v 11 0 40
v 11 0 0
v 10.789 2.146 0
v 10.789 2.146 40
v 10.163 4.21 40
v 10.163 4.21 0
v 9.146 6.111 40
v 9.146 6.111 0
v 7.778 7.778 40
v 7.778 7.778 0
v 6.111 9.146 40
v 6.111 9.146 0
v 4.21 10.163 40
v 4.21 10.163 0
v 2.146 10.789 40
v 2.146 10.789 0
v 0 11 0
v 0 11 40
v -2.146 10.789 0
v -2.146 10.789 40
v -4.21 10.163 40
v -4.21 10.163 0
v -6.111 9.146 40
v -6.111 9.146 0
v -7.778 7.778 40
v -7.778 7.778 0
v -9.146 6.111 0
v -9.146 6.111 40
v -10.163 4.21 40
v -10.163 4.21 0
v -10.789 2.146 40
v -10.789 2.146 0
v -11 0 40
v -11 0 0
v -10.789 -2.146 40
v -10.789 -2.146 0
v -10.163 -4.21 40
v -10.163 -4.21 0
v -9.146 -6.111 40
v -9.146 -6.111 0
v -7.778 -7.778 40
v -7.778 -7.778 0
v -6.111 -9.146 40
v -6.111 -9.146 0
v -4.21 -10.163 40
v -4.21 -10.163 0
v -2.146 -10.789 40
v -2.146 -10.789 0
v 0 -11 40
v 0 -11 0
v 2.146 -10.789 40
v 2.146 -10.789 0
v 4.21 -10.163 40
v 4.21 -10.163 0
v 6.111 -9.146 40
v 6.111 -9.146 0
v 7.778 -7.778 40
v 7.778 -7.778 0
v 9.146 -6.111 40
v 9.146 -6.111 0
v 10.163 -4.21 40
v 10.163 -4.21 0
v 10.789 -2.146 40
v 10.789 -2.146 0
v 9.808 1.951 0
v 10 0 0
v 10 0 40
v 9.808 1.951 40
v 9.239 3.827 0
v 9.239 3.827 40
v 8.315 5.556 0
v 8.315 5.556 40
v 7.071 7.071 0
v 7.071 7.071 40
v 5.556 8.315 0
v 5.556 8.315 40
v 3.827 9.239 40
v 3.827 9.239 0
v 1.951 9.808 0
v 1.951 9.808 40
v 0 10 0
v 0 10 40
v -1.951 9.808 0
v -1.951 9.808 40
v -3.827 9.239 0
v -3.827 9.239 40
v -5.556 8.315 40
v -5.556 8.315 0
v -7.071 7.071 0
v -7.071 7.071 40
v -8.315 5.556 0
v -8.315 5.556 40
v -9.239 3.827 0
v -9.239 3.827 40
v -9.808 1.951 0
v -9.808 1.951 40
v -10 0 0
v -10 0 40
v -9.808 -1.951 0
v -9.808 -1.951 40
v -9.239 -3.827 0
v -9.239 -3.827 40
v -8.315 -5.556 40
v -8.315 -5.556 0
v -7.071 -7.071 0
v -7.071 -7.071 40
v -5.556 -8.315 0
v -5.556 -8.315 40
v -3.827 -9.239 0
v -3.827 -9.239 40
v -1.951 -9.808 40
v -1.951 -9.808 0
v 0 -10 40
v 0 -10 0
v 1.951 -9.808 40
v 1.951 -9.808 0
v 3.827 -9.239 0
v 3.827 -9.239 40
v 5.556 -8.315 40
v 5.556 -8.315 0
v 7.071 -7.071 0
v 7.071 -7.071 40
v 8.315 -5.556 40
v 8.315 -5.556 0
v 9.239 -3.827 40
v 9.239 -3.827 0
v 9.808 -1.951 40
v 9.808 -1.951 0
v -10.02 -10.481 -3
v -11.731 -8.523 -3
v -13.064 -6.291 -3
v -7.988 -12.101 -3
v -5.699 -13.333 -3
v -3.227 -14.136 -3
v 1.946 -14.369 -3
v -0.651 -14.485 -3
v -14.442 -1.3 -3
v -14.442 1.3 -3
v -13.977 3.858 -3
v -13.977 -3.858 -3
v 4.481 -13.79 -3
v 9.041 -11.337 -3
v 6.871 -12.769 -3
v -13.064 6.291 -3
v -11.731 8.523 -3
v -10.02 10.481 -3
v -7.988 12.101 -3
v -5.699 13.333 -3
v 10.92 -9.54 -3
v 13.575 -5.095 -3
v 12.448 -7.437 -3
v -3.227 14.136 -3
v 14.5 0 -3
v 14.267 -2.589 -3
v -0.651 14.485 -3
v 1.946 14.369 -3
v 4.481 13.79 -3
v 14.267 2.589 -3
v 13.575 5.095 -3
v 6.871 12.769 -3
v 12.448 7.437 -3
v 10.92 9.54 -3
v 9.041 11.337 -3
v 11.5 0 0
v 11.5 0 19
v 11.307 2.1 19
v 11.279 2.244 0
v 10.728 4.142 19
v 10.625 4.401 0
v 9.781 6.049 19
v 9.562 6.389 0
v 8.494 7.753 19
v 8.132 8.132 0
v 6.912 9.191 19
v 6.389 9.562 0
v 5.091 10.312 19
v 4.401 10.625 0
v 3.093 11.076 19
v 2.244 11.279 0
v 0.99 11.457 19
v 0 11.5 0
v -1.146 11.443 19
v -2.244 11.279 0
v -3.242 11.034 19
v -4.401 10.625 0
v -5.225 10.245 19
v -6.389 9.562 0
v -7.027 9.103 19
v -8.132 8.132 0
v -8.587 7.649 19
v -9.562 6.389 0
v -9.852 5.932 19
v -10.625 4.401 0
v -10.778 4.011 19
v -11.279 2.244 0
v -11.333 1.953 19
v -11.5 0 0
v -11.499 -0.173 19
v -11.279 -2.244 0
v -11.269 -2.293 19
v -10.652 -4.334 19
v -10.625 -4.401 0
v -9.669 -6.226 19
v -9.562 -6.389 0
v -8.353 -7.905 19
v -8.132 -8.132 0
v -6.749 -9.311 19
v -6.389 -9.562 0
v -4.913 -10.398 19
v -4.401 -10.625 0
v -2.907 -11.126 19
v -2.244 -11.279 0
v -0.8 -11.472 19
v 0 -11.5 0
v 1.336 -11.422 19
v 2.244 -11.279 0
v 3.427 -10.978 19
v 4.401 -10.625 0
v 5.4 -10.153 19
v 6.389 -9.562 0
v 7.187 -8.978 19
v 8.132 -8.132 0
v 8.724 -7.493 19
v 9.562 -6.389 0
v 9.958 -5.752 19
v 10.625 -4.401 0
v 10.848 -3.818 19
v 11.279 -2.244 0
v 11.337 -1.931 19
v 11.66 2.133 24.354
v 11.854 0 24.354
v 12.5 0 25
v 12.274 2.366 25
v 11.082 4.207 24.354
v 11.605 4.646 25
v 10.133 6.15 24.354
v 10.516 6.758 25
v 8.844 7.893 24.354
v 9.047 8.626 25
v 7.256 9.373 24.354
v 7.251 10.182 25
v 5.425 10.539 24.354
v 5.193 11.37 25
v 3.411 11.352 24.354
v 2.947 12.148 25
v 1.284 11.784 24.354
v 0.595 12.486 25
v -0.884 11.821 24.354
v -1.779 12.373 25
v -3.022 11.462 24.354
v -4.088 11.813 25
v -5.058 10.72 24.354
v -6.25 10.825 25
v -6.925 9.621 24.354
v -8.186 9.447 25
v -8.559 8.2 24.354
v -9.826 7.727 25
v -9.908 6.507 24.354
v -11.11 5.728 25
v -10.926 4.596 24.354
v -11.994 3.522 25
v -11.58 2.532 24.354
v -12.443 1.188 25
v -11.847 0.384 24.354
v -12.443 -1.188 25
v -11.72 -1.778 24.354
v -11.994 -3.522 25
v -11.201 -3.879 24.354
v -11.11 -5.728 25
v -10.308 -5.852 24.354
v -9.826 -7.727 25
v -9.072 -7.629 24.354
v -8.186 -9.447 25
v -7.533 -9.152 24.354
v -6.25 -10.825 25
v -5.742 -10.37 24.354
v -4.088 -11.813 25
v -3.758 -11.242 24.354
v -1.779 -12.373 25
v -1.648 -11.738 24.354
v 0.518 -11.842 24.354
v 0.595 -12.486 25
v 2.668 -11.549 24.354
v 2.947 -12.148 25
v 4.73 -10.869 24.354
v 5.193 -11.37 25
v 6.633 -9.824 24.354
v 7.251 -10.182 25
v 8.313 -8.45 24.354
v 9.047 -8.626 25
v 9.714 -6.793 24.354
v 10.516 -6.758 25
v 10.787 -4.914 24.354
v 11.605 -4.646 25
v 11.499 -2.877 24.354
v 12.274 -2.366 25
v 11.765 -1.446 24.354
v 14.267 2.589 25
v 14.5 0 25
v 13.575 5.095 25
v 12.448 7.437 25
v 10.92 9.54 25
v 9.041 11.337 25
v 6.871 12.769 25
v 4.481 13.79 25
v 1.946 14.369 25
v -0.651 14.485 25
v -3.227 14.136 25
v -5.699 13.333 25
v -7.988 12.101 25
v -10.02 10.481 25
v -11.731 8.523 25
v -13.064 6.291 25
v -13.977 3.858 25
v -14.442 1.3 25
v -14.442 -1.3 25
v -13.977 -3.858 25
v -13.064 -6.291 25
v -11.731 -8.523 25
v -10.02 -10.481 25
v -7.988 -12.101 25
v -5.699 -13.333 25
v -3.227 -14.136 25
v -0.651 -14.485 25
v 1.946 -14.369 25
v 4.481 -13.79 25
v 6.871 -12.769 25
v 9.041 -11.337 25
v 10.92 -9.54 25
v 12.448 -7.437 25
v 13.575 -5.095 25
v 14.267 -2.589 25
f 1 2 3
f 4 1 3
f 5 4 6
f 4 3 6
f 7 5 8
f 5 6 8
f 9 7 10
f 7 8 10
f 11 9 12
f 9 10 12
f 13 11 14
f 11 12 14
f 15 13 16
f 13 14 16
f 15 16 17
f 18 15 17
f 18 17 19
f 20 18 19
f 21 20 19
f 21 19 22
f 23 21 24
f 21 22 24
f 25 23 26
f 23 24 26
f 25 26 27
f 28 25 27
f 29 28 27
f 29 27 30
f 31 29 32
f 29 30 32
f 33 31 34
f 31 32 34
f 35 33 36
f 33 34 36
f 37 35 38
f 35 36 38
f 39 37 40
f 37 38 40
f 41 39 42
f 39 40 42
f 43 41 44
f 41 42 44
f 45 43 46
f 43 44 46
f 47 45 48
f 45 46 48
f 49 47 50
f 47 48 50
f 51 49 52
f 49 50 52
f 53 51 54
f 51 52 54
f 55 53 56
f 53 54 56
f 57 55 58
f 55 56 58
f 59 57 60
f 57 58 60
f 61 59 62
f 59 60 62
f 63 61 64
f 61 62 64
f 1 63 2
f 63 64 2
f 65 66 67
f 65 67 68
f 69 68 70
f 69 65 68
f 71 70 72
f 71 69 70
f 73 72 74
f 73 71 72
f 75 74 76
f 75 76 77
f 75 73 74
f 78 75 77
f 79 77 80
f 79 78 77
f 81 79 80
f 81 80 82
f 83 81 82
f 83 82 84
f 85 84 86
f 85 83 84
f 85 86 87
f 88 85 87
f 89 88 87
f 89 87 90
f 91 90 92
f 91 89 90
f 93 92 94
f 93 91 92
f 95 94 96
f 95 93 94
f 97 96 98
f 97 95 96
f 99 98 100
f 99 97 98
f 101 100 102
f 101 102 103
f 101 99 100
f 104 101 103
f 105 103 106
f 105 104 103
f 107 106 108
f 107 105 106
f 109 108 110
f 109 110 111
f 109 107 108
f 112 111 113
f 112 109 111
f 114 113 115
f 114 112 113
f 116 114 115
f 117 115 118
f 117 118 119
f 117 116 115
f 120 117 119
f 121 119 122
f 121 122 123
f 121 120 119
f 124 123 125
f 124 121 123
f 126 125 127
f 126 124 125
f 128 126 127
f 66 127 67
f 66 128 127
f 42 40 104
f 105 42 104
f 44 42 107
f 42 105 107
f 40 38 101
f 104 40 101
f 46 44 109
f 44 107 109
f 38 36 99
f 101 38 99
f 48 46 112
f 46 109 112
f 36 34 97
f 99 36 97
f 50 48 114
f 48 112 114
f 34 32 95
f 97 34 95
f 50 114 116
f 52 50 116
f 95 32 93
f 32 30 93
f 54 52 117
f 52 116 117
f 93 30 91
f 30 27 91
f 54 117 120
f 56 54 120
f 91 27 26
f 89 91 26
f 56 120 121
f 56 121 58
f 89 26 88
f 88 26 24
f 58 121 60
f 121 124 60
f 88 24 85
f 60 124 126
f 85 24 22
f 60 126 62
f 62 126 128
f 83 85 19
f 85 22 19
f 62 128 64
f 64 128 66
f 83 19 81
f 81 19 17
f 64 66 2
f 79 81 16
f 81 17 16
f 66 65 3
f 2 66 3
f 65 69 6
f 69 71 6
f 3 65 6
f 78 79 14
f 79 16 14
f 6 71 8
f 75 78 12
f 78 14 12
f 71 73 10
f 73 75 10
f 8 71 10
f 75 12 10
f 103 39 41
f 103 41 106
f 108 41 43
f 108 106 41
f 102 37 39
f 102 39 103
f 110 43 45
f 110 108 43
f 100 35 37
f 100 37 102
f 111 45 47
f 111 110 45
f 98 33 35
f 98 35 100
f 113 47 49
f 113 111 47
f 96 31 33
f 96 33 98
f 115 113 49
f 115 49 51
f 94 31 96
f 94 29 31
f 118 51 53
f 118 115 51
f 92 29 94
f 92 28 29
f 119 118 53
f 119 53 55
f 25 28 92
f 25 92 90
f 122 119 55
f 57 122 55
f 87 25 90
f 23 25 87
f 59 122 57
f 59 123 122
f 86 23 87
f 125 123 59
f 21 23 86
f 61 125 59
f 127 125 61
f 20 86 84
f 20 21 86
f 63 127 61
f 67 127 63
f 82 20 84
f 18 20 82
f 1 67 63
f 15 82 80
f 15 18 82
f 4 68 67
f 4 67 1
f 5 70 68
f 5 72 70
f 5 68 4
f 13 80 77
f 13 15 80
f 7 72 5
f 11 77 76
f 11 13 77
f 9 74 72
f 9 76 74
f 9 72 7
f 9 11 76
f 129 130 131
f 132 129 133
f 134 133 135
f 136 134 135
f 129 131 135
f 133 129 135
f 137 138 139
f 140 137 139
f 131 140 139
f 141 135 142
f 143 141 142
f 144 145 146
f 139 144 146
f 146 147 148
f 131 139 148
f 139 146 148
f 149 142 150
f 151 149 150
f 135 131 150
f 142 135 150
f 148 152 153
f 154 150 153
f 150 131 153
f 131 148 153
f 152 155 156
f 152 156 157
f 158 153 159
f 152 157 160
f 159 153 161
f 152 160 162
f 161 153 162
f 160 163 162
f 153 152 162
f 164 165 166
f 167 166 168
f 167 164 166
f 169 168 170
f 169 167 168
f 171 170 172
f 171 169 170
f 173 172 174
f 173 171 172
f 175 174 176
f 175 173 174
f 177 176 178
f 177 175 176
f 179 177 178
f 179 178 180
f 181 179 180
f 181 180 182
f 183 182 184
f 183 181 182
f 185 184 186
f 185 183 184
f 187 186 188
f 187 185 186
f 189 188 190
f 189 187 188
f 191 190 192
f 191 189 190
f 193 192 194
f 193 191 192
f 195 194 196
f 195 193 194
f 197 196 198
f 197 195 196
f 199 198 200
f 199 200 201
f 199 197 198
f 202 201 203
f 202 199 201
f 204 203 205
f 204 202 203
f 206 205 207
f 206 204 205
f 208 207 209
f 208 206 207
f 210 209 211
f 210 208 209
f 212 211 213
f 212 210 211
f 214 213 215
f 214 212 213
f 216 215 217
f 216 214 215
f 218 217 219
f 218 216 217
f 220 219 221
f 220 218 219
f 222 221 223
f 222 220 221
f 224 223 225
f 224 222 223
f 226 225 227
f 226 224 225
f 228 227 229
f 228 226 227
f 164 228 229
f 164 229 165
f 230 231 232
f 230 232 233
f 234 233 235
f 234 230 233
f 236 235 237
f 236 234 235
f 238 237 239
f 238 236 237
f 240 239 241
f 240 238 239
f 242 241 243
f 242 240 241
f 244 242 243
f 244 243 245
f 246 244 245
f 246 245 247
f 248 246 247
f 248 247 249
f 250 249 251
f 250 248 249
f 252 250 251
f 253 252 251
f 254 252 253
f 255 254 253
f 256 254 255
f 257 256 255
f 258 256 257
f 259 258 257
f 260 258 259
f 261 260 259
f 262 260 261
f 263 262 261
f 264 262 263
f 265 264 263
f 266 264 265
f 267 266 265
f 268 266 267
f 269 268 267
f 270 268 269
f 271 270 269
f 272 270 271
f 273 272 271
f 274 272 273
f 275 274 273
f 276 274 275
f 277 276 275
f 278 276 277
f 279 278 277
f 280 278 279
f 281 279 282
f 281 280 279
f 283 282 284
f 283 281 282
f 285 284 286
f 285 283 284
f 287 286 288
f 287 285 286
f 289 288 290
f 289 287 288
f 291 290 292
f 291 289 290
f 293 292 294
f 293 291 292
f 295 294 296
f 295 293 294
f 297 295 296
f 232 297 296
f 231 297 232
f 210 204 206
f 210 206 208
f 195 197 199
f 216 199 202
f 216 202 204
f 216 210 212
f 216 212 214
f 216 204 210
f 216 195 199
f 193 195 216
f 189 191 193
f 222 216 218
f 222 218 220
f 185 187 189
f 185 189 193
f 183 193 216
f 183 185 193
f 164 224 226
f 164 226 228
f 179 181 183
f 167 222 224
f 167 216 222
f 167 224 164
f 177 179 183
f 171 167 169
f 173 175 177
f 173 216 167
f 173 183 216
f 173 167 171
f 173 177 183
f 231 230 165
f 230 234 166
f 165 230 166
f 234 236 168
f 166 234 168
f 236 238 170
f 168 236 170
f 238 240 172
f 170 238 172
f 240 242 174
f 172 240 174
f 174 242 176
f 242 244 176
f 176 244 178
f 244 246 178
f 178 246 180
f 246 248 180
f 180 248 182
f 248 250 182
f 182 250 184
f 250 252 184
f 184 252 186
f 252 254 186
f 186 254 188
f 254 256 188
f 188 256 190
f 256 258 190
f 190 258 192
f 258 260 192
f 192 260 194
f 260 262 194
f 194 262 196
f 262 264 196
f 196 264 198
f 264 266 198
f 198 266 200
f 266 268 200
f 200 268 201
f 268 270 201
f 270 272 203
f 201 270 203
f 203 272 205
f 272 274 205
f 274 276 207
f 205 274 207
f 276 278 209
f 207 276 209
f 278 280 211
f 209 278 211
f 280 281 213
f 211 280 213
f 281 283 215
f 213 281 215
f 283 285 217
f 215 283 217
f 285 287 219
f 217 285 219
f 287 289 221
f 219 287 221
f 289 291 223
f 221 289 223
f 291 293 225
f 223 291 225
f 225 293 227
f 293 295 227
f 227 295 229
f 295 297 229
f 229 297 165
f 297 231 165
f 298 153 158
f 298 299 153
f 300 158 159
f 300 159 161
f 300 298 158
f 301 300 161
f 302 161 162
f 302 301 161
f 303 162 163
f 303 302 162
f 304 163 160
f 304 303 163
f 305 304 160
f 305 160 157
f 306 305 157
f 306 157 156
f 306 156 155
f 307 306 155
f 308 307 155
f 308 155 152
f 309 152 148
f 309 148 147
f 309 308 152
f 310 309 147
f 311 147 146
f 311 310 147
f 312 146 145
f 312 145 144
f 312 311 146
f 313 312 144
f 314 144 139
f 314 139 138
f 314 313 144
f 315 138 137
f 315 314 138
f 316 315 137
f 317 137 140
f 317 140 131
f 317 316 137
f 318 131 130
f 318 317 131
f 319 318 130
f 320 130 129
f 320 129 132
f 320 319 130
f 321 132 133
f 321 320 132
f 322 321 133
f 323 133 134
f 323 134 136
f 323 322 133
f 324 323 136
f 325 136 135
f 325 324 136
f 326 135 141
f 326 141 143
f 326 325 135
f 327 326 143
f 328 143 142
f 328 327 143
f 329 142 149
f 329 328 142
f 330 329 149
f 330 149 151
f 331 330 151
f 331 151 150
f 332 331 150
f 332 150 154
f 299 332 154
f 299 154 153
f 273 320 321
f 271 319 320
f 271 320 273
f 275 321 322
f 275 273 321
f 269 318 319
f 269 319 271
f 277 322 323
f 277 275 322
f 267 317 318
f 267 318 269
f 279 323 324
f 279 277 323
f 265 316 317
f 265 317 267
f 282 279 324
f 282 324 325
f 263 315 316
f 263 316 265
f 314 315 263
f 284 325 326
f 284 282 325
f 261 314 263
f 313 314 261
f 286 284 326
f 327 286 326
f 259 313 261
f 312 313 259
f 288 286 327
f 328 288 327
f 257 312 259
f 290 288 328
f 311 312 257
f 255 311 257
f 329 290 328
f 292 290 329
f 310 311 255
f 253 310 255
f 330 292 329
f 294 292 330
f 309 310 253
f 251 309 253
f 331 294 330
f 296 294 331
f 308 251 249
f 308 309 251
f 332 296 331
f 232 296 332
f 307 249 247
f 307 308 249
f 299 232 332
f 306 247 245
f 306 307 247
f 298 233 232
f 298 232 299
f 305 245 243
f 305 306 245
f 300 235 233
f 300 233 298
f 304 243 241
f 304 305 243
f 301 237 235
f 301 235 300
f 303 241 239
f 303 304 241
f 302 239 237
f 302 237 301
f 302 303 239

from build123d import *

# Parameters (mm, degrees)
F0_R     = 11
F0_R_2   = 10
F1_DEPTH = 40
F2_R     = 14.5
F2_R_2   = 11.5
F3_DEPTH = 25
F4_R     = 14.5
F5_DEPTH = 3
F6_SIZE  = 1
F7_SIZE2 = 5
F7_SIZE  = 0.5


with BuildPart() as f1:
    # F0 (on Top) → F1 (new body)
    with BuildSketch(Plane.XY):
        Circle(F0_R)
        Circle(F0_R_2, mode=Mode.SUBTRACT)
    extrude(amount=F1_DEPTH)


with BuildPart() as f3:
    # F2 (on Top) → F3 (new body)
    with BuildSketch(Plane.XY):
        Circle(F2_R)
        Circle(F2_R_2, mode=Mode.SUBTRACT)
    extrude(amount=F3_DEPTH)

    # F4 (on Top) → F5 (join)
    with BuildSketch(Plane.XY):
        Circle(F4_R)
    extrude(amount=-F5_DEPTH)

    # F6
    f6_edges = [f3.edges().sort_by_distance(p)[0] for p in [
        (-11.5, 0, 25),
    ]]
    chamfer(f6_edges, length=F6_SIZE)

    # F7
    f7_edges = [f3.edges().sort_by_distance(p)[0] for p in [
        (-11.5, 0, 24),
    ]]
    chamfer(f7_edges, length=F7_SIZE, length2=F7_SIZE2)


solid = Compound([f1.part, f3.part])
